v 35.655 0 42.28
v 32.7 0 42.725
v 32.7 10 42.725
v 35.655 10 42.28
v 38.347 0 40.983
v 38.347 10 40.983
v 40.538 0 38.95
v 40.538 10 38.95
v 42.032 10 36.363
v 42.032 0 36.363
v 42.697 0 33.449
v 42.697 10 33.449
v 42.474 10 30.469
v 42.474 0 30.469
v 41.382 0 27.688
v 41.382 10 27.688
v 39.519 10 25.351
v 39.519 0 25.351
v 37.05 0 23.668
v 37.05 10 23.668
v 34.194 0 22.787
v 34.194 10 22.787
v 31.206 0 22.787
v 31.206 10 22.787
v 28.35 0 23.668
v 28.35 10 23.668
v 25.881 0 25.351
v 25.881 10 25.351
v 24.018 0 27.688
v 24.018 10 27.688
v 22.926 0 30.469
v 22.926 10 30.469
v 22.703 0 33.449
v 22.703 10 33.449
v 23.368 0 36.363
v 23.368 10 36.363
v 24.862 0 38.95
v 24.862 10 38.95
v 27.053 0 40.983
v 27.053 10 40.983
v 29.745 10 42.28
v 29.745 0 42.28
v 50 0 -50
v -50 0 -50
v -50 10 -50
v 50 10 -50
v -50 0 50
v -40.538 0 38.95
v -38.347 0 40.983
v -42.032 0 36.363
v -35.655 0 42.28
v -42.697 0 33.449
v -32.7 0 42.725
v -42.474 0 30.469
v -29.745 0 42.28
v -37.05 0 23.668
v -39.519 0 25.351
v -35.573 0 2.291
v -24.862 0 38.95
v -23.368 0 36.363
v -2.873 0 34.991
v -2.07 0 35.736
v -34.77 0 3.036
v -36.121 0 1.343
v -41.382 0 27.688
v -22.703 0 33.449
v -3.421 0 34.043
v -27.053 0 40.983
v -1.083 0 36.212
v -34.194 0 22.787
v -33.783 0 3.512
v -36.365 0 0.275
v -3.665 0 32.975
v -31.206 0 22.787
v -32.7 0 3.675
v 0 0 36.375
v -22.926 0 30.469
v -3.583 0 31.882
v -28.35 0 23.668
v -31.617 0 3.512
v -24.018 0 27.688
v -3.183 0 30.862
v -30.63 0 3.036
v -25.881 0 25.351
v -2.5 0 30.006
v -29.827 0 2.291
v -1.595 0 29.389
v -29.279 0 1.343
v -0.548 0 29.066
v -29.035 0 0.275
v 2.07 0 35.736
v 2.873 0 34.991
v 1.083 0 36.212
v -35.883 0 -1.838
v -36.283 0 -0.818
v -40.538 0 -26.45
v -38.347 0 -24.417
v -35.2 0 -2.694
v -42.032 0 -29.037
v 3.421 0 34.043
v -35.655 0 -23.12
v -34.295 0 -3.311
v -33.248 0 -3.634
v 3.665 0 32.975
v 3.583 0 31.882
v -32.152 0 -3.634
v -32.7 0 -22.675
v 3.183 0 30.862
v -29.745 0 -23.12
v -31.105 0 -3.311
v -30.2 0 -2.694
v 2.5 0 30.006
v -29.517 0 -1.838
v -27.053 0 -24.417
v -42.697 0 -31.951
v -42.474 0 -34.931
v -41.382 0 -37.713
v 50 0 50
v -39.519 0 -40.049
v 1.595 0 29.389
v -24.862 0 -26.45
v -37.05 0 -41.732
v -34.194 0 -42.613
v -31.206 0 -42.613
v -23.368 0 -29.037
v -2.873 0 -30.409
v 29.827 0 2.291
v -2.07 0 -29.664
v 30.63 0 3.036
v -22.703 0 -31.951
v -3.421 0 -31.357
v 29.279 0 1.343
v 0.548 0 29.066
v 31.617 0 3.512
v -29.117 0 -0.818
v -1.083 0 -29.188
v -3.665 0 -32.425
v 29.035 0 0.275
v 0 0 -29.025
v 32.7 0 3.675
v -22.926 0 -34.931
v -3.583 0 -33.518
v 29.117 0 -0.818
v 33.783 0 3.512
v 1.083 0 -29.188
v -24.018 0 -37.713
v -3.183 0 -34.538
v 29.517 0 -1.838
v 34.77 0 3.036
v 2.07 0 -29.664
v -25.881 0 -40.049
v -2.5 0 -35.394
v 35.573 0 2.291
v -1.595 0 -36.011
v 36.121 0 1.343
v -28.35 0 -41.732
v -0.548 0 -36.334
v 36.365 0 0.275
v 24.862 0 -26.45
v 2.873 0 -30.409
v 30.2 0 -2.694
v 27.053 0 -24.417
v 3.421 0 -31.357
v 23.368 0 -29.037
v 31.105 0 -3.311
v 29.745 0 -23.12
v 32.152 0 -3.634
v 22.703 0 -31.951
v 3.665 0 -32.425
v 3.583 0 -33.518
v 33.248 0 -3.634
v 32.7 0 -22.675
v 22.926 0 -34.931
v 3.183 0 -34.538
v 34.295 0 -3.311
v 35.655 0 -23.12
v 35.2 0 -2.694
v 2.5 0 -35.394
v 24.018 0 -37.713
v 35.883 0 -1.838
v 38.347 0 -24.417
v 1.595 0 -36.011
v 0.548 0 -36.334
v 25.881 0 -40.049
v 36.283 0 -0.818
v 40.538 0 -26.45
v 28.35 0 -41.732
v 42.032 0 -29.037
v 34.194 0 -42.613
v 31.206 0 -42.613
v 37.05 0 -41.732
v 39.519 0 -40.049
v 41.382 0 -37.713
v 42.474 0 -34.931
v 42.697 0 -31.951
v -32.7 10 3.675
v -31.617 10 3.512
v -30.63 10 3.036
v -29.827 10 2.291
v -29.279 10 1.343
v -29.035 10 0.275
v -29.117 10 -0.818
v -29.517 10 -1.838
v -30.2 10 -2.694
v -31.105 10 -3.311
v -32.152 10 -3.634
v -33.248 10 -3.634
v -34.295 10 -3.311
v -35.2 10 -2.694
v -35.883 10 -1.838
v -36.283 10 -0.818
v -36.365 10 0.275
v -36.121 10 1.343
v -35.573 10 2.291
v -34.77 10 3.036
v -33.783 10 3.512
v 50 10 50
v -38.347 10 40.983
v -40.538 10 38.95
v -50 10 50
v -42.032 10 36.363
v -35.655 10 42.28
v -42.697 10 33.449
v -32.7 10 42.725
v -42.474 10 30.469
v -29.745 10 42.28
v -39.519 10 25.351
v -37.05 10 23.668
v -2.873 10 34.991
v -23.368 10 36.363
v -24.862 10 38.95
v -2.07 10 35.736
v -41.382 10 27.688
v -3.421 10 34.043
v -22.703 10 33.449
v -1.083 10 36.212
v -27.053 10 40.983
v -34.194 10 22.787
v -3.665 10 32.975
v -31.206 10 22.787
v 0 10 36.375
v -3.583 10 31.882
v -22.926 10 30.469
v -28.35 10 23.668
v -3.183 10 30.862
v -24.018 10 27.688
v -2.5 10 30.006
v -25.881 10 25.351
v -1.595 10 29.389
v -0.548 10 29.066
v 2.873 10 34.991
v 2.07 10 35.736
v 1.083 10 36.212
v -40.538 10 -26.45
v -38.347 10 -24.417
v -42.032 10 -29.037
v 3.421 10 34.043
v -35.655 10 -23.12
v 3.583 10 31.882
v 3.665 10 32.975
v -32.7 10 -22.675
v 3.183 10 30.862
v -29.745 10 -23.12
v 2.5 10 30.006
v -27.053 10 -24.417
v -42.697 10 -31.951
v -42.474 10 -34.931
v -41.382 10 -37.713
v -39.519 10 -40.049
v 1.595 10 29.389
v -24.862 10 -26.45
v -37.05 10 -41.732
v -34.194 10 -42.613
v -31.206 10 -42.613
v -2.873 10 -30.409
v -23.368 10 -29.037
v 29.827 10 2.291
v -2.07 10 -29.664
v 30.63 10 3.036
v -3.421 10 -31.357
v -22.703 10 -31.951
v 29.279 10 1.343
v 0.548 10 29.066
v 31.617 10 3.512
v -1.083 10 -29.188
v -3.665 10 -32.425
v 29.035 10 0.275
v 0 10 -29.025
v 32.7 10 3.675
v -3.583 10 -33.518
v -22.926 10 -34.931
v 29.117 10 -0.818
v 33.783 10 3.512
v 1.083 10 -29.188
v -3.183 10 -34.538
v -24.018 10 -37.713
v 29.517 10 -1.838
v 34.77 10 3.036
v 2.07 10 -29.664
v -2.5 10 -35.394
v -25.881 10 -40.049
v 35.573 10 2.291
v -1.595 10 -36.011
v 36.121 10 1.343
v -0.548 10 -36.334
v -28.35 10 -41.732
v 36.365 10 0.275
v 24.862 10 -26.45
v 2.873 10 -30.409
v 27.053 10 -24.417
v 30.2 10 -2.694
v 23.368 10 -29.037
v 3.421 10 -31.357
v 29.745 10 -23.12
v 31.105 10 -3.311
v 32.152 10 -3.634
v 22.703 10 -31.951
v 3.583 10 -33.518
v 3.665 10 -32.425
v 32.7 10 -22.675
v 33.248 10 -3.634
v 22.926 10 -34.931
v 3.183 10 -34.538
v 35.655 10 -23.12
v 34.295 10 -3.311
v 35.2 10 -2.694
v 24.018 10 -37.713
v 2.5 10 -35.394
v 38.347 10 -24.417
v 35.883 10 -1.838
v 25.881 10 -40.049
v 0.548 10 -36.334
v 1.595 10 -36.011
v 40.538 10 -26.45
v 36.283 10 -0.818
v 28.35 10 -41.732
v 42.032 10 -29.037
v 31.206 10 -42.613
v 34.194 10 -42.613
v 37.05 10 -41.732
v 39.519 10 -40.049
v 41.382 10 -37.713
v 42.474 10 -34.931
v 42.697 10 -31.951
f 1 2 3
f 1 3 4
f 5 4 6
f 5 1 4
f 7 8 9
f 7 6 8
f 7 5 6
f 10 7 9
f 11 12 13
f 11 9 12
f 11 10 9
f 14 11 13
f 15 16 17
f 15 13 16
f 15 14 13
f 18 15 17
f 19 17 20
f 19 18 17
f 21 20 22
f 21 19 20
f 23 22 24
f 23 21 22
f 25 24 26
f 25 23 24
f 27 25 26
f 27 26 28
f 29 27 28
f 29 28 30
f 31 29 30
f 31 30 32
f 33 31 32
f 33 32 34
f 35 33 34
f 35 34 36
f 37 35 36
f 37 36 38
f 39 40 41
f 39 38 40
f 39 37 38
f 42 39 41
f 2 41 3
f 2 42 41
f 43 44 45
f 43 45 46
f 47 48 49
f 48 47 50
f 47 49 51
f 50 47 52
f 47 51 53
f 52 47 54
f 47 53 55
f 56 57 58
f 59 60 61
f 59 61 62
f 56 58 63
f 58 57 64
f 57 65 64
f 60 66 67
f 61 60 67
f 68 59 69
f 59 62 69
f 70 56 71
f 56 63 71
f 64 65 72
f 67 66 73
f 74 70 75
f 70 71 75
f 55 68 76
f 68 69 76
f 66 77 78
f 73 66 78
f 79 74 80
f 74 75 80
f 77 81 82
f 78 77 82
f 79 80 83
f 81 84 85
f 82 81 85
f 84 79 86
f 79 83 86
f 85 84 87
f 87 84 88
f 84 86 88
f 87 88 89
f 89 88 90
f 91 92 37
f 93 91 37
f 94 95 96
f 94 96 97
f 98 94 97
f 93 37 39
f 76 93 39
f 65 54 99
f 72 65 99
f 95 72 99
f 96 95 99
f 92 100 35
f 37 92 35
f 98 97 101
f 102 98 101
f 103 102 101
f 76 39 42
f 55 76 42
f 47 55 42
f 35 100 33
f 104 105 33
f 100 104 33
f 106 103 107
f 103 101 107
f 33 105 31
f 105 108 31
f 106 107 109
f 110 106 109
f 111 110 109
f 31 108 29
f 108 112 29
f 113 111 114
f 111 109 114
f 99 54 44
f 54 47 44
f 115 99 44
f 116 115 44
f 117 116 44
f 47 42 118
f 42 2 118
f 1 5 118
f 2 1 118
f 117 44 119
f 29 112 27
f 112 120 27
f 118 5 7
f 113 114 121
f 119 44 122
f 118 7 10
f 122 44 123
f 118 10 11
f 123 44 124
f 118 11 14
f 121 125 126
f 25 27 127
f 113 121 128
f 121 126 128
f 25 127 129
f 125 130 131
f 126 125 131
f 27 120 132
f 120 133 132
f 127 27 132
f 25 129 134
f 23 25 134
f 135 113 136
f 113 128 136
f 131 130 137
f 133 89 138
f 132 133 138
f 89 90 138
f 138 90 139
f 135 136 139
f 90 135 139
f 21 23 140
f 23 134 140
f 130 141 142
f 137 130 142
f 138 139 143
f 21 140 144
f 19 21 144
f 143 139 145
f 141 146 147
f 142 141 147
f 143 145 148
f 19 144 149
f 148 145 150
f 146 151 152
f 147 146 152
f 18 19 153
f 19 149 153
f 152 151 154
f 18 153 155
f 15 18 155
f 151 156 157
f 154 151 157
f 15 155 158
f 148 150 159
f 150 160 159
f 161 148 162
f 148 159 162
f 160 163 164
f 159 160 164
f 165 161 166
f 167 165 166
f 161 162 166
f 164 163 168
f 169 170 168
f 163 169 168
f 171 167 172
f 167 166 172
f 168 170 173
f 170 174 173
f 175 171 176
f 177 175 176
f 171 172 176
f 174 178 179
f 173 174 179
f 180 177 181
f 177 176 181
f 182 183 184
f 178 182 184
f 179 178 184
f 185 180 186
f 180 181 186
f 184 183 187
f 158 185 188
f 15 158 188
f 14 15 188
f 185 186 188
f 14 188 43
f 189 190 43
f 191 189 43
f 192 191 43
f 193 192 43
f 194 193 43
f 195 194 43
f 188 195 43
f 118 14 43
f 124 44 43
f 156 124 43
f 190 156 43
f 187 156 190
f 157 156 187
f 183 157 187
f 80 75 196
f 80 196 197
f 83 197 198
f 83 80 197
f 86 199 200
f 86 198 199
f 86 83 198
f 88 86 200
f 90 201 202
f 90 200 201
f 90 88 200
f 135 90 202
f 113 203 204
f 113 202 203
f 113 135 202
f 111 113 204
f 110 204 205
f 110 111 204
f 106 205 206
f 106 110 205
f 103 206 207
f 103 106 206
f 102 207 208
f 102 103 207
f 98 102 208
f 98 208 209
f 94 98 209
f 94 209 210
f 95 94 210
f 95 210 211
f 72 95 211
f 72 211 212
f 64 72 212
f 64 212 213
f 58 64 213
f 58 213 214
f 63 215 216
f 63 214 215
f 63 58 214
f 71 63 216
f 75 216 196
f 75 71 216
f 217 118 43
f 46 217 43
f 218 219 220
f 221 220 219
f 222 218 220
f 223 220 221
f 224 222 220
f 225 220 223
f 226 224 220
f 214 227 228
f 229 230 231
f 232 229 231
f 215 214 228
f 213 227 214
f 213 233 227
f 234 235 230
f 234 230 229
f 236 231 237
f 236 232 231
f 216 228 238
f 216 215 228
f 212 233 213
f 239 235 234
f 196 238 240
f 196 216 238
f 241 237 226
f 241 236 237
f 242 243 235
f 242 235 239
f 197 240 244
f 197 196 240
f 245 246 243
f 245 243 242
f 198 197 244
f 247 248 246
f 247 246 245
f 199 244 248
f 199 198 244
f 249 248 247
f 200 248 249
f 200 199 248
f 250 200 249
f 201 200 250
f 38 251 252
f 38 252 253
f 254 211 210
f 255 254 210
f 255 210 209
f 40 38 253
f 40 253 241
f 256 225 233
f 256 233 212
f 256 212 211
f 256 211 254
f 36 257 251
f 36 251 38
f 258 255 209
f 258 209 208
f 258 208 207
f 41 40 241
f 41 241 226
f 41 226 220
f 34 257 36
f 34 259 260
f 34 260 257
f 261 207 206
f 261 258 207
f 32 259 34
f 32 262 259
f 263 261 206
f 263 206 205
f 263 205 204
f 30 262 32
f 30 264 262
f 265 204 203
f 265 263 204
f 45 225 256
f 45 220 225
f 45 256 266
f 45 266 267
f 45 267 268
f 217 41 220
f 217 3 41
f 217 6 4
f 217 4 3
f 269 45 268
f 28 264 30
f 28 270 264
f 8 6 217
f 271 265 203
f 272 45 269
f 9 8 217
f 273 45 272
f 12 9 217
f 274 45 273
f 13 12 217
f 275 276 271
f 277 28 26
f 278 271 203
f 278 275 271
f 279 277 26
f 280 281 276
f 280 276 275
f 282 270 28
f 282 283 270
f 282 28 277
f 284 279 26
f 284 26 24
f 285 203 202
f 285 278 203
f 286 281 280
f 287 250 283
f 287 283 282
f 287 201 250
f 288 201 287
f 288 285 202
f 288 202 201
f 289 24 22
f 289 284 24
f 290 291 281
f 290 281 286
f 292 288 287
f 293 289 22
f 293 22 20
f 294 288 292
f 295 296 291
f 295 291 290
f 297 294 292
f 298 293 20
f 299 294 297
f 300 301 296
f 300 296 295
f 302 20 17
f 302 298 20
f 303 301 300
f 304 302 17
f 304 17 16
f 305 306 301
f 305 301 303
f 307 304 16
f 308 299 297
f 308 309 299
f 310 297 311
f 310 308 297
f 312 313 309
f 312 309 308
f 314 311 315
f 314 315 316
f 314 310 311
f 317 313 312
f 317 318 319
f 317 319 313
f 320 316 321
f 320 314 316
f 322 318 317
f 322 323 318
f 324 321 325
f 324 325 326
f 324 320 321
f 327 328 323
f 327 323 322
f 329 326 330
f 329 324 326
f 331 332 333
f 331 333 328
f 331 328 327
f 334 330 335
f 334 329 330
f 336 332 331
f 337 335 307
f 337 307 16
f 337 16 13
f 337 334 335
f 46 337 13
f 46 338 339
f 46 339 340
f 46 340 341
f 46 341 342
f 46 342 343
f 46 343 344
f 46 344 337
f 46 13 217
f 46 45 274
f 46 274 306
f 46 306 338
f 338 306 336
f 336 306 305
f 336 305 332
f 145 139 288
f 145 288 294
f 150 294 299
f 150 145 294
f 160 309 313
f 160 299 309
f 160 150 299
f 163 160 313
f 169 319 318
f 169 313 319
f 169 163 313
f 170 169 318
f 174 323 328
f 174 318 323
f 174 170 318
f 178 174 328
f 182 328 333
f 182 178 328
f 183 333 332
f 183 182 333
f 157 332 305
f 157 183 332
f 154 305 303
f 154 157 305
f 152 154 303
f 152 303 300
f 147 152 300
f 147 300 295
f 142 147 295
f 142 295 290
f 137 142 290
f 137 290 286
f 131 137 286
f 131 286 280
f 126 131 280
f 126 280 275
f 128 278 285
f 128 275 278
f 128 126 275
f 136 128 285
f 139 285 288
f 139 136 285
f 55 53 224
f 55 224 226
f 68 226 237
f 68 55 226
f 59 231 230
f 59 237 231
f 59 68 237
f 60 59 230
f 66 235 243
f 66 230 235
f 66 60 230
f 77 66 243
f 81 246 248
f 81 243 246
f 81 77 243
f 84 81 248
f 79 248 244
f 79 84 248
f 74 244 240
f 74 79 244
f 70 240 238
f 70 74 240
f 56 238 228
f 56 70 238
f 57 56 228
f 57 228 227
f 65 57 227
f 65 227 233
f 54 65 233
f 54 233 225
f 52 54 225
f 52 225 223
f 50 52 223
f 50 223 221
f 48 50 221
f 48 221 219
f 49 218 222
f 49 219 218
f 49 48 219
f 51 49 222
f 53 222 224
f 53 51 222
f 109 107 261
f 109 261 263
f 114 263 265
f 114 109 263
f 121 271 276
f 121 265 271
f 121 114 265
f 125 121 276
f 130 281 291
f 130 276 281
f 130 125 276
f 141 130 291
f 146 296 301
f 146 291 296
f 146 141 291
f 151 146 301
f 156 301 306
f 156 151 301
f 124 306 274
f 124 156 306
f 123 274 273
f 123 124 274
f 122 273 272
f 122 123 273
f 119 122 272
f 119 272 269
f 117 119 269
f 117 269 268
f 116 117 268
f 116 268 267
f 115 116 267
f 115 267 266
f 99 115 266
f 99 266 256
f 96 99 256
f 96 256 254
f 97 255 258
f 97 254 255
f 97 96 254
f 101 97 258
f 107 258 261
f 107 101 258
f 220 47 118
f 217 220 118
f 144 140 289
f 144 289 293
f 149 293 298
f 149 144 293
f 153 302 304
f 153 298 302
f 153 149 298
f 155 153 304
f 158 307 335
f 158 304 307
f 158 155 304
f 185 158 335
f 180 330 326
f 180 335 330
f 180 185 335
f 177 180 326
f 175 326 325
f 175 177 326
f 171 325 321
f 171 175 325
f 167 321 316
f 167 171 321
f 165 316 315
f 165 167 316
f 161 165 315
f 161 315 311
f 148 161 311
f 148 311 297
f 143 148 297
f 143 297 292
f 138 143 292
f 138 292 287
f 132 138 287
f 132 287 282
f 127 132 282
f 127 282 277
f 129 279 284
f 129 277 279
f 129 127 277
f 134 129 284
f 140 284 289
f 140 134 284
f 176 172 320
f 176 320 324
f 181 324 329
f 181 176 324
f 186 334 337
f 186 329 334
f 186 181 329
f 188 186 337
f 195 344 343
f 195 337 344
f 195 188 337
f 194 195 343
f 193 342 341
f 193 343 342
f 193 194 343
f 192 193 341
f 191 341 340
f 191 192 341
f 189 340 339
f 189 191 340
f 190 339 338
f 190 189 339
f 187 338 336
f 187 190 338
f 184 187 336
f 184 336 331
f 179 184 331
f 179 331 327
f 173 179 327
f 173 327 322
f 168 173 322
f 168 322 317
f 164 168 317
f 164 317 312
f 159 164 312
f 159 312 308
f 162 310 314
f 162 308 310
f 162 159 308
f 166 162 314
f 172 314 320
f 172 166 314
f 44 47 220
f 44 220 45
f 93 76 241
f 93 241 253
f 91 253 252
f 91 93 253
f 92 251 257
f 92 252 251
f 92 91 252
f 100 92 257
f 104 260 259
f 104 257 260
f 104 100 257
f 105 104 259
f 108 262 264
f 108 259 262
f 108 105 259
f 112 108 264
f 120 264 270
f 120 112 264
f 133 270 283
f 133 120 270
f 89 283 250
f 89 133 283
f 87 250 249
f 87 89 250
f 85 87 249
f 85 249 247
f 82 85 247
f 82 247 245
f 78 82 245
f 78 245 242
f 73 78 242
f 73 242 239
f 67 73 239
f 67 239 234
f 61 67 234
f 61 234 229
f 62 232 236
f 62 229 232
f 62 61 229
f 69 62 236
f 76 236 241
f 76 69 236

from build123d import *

# Parameters (mm, degrees)
SKETCH1_W               = 100
SKETCH1_H               = 100
BOSS_EXTRUDE1_DEPTH     = 10
CUT_EXTRUDE3_DEPTH      = 72.414284285
CUT_EXTRUDE3_DEPTH_BACK = 72.414284285
SKETCH3_R               = 10.025
SKETCH3_R_2             = 3.675


with BuildPart() as part:
    # Sketch1 → Boss-Extrude1 (new body)
    with BuildSketch(Plane(origin=(0, 0, 0), x_dir=(1, 0, 0), z_dir=(0, 1, 0))):
        Rectangle(SKETCH1_W, SKETCH1_H)
    extrude(amount=BOSS_EXTRUDE1_DEPTH)

    # Sketch3 → Cut-Extrude3 (cut, two sides: drawn at the far end of the back side and taken through both)
    with BuildSketch(Plane(origin=(0, 0, 0), x_dir=(1, 0, 0), z_dir=(0, 1, 0)).offset(-CUT_EXTRUDE3_DEPTH_BACK)):
        with Locations(Location((-32.7, 32.7, 0), (0, 0, 270))):
            Circle(SKETCH3_R)
        with Locations(Location((32.7, 32.7, 0), (0, 0, 270))):
            Circle(SKETCH3_R)
        with Locations(Location((32.7, -32.7, 0), (0, 0, 270))):
            Circle(SKETCH3_R)
        with Locations(Location((-32.7, -32.7, 0), (0, 0, 270))):
            Circle(SKETCH3_R)
        with Locations(Location((0, 32.7, 0), (0, 0, 270))):
            Circle(SKETCH3_R_2)
        with Locations(Location((32.7, 0, 0), (0, 0, 270))):
            Circle(SKETCH3_R_2)
        with Locations(Location((0, -32.7, 0), (0, 0, 270))):
            Circle(SKETCH3_R_2)
        with Locations(Location((-32.7, 0, 0), (0, 0, 270))):
            Circle(SKETCH3_R_2)
    extrude(amount=CUT_EXTRUDE3_DEPTH + CUT_EXTRUDE3_DEPTH_BACK, mode=Mode.SUBTRACT)


solid = part.part
